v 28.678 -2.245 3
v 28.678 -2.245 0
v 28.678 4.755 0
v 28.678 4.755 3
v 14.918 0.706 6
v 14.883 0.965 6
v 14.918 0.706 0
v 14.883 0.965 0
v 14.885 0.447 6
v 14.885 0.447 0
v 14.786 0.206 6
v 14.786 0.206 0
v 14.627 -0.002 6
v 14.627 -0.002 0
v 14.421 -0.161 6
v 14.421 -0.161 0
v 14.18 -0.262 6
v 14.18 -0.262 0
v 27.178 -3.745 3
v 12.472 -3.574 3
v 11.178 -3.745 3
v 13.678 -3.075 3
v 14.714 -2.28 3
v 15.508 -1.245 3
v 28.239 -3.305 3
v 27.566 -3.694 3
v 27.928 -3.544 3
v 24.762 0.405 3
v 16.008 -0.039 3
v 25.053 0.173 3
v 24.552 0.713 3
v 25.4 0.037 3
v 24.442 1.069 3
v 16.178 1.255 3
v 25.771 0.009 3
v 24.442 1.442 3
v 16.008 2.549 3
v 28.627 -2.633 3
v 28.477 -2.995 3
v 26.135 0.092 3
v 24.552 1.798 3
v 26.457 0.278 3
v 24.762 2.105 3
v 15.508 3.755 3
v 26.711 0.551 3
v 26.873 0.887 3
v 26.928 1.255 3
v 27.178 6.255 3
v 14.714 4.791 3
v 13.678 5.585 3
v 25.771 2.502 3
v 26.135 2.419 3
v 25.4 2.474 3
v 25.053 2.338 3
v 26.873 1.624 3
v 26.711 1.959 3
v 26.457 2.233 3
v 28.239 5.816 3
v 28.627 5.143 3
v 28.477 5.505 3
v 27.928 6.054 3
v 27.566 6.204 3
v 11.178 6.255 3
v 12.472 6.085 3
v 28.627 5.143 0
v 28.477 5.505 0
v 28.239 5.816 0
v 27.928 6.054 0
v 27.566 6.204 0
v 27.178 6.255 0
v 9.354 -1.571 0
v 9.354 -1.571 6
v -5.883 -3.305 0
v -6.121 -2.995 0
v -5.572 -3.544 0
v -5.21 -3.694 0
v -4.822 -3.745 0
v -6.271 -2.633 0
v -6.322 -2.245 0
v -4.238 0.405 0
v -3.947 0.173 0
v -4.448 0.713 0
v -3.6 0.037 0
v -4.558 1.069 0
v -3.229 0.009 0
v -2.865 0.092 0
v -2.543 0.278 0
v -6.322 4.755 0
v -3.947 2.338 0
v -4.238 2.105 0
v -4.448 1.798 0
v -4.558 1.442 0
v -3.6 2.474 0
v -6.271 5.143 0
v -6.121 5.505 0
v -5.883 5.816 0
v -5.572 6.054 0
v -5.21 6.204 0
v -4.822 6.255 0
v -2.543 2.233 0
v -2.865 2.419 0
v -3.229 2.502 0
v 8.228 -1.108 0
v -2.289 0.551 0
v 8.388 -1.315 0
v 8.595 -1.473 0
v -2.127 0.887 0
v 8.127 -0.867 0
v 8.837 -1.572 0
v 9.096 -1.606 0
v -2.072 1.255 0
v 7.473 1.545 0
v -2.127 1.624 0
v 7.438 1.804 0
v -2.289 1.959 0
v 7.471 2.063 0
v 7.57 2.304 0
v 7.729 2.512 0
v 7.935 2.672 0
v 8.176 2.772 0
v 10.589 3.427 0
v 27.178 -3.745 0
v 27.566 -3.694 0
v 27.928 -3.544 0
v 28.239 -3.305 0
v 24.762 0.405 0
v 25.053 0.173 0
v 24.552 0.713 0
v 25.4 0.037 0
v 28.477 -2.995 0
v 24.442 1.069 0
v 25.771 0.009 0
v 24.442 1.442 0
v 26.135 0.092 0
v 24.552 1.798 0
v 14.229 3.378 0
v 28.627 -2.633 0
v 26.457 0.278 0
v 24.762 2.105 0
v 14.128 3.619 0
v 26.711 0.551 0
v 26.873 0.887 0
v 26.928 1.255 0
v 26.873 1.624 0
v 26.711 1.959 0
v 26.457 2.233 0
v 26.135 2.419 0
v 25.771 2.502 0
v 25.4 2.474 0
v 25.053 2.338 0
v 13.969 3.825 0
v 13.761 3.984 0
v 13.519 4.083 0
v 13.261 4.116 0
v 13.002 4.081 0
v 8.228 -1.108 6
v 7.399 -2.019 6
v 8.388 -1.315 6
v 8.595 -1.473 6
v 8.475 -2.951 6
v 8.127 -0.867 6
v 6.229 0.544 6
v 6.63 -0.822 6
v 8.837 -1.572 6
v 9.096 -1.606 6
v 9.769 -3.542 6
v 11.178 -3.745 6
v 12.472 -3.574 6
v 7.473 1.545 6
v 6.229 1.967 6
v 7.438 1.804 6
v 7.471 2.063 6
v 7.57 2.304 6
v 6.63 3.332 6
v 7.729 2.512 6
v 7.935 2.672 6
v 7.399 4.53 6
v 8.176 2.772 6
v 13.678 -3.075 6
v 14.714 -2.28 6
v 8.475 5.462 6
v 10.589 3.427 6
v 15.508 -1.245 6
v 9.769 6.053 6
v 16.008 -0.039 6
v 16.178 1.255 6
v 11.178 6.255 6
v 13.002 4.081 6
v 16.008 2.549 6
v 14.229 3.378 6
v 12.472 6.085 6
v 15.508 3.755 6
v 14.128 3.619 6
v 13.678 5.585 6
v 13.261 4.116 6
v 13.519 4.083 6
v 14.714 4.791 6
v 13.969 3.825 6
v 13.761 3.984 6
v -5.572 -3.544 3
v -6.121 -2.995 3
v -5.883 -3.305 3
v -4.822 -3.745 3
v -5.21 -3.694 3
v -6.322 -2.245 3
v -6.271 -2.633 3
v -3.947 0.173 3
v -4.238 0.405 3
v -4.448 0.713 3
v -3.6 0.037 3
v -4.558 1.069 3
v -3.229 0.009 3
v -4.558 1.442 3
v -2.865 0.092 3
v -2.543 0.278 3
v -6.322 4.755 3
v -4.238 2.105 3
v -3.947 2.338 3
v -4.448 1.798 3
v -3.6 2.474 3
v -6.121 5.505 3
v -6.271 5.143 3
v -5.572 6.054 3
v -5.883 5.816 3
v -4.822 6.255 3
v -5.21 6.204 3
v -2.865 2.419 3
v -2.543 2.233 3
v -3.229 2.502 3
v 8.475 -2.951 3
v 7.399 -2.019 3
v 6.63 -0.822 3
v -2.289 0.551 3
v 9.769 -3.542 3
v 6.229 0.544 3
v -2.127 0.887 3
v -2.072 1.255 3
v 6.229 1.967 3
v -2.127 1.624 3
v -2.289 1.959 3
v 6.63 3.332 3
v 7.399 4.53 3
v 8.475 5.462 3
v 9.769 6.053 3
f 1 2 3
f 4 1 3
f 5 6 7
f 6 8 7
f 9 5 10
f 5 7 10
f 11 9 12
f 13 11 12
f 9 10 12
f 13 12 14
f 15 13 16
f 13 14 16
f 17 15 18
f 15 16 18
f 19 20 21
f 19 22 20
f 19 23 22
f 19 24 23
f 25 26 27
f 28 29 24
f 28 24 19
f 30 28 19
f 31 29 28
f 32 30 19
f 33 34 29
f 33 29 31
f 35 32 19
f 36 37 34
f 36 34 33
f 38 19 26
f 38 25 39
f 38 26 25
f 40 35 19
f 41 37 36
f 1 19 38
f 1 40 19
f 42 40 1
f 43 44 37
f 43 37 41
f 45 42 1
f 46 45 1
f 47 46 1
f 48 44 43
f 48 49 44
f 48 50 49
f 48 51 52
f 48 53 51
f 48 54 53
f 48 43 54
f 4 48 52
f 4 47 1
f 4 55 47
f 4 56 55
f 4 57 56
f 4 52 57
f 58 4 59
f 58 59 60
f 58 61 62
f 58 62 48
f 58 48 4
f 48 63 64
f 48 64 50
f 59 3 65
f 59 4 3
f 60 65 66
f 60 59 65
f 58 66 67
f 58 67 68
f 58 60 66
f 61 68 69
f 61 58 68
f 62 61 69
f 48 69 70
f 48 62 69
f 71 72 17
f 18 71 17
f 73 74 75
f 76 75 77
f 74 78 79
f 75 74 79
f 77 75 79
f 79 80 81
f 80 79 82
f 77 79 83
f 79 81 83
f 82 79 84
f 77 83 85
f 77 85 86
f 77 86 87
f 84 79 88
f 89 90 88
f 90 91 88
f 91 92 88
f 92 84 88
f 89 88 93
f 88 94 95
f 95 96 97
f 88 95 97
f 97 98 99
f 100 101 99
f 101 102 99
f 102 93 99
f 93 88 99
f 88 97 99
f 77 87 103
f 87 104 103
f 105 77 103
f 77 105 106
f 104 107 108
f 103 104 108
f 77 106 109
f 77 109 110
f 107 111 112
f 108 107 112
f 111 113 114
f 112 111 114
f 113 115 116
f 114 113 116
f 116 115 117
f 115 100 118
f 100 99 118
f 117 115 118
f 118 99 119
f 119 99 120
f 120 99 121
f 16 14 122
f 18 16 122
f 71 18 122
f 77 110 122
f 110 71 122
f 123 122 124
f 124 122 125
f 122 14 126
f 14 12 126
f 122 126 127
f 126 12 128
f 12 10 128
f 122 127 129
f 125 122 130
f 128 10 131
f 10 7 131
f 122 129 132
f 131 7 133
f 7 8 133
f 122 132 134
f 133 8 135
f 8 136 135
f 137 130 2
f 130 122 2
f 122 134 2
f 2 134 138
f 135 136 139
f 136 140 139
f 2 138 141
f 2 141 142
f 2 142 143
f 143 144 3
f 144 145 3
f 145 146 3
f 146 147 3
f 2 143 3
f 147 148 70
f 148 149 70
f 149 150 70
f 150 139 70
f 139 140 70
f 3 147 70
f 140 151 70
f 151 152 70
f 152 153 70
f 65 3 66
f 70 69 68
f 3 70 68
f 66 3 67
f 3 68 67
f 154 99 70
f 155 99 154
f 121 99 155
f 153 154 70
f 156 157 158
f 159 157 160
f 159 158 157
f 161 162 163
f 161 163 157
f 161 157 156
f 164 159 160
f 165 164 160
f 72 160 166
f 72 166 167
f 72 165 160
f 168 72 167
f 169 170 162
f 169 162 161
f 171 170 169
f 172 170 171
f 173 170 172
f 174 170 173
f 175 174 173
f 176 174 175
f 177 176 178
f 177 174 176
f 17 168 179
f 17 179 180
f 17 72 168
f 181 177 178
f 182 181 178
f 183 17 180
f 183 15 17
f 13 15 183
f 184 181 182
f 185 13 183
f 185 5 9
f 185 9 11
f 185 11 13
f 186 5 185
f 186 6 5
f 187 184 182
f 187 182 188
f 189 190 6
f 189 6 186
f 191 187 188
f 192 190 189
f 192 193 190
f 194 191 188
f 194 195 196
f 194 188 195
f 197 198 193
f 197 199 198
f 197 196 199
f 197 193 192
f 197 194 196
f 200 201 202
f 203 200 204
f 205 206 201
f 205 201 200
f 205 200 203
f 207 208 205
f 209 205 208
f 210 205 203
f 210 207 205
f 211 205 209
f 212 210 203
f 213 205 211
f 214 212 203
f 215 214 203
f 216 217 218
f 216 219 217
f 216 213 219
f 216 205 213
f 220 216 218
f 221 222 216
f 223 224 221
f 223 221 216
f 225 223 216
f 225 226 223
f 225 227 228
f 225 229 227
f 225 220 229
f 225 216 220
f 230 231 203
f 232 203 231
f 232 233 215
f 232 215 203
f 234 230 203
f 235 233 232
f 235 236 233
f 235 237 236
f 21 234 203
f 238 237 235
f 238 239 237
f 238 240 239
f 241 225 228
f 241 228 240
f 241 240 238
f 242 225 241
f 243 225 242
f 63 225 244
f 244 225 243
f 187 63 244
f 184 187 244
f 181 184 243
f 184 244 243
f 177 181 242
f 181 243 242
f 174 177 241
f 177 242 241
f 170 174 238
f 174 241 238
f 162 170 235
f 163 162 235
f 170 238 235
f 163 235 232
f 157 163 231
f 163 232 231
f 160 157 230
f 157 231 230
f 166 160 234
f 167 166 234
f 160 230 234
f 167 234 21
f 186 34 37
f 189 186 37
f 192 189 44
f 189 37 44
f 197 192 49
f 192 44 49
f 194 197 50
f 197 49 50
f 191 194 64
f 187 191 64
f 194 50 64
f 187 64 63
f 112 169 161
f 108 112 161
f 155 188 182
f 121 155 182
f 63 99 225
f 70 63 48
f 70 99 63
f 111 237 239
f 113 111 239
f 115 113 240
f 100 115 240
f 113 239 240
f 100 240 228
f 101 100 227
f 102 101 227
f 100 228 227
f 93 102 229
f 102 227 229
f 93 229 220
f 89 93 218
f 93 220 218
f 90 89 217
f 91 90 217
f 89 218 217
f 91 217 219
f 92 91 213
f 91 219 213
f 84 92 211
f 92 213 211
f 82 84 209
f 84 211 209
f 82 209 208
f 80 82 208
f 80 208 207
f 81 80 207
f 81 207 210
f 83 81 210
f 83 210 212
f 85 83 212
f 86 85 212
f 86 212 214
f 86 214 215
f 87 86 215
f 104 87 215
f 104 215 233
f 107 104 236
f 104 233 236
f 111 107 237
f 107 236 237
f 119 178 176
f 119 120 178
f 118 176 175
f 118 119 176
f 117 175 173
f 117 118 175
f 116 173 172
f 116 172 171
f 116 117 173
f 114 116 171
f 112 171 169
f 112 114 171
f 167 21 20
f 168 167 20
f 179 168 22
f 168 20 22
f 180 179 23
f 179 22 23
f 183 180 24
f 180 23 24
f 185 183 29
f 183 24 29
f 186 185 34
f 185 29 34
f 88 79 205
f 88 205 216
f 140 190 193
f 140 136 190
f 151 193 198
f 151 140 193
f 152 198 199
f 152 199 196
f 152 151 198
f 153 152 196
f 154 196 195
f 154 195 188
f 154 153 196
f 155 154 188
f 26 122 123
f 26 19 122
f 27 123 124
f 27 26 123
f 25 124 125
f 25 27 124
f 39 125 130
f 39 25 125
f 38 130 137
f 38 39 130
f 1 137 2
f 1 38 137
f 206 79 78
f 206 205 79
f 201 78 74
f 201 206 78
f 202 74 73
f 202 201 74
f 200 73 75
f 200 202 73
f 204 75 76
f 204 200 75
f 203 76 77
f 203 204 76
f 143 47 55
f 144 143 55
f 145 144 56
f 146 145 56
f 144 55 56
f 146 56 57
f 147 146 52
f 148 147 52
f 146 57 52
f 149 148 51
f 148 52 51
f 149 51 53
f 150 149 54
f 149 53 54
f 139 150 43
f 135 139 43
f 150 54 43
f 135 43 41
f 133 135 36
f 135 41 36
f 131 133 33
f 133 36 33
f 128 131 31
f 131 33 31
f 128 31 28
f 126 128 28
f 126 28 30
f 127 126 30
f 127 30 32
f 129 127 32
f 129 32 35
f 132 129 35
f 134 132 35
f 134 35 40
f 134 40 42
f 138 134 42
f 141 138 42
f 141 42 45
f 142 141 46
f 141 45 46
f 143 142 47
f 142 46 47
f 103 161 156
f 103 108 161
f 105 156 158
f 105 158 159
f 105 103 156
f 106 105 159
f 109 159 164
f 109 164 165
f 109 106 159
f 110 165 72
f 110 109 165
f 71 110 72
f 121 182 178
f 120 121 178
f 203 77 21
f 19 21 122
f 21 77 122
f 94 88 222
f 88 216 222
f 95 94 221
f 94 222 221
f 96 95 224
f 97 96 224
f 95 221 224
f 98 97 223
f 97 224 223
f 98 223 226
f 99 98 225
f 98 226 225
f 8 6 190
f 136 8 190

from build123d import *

# Parameters (mm, degrees)
F0_W      = 35
F0_H      = 10
F1_DEPTH  = 3
F2_R      = 1.5
F4_DEPTH  = 3
F6_DEPTH  = 6
F7_R      = 1
F8_R      = 1.25
F10_DEPTH = 3
F9_R      = 1.25
F11_DEPTH = 3


with BuildPart() as f1:
    # F0 (on Top) → F1 (new body)
    with BuildSketch(Plane.XY):
        with Locations((11.178067, 1.255235)):
            Rectangle(F0_W, F0_H)
    extrude(amount=F1_DEPTH)

    # F2
    f2_edges = [f1.edges().sort_by_distance(p)[0] for p in [
        (-6.321933, -3.744765, 1.5),
        (-6.321933, 6.255235, 1.5),
        (28.678067, -3.744765, 1.5),
        (28.678067, 6.255235, 1.5),
    ]]
    fillet(f2_edges, radius=F2_R)

    # F3 (on face) → F4 (join)
    with BuildSketch(Plane.XY.offset(3)):
        with BuildLine():
            ThreePointArc((11.178067, -3.744765), (14.713601, -2.280299), (16.178067, 1.255235))
            ThreePointArc((16.178067, 1.255235), (14.713601, 4.790769), (11.178067, 6.255235))
            ThreePointArc((11.178067, 6.255235), (6.178067, 1.255235), (11.178067, -3.744765))
        make_face()
    extrude(amount=F4_DEPTH)

    # F5 (on face) → F6 (cut)
    with BuildSketch(Plane.XY.offset(6)):
        with BuildLine():
            ThreePointArc((13.428067, 1.255235), (12.545025, 3.042391), (10.589023, 3.426762))
            ThreePointArc((10.589023, 3.426762), (9.006541, 0.666191), (11.767111, -0.916291))
            ThreePointArc((11.767111, -0.916291), (12.965222, -0.111723), (13.428067, 1.255235))
        make_face()
        with BuildLine():
            Line((13.966953, 4.343053), (10.589023, 3.426762))
            ThreePointArc((10.589023, 3.426762), (12.545025, 3.042391), (13.428067, 1.255235))
            ThreePointArc((13.428067, 1.255235), (12.965222, -0.111723), (11.767111, -0.916291))
            Line((11.767111, -0.916291), (15.145041, 0))
            Line((15.145041, 0), (13.966953, 4.343053))
        make_face()
        with BuildLine():
            Line((10.589023, 3.426762), (7.211093, 2.51047))
            Line((7.211093, 2.51047), (8.389181, -1.832582))
            Line((8.389181, -1.832582), (11.767111, -0.916291))
            ThreePointArc((11.767111, -0.916291), (9.006541, 0.666191), (10.589023, 3.426762))
        make_face()
    extrude(amount=-F6_DEPTH, mode=Mode.SUBTRACT)

    # F7
    f7_edges = [f1.edges().sort_by_distance(p)[0] for p in [
        (7.211093, 2.51047, 3),
        (8.389181, -1.832582, 3),
        (15.145041, 0, 3),
        (13.966953, 4.343053, 3),
    ]]
    fillet(f7_edges, radius=F7_R)

    # F8 (on face) → F10 (cut)
    with BuildSketch(Plane.XY.offset(3)):
        with Locations((-3.321933, 1.255235)):
            Circle(F8_R)
    extrude(amount=-F10_DEPTH, mode=Mode.SUBTRACT)

    # F9 (on face) → F11 (cut)
    with BuildSketch(Plane.XY.offset(3)):
        with Locations((25.678067, 1.255235)):
            Circle(F9_R)
    extrude(amount=-F11_DEPTH, mode=Mode.SUBTRACT)


solid = f1.part
